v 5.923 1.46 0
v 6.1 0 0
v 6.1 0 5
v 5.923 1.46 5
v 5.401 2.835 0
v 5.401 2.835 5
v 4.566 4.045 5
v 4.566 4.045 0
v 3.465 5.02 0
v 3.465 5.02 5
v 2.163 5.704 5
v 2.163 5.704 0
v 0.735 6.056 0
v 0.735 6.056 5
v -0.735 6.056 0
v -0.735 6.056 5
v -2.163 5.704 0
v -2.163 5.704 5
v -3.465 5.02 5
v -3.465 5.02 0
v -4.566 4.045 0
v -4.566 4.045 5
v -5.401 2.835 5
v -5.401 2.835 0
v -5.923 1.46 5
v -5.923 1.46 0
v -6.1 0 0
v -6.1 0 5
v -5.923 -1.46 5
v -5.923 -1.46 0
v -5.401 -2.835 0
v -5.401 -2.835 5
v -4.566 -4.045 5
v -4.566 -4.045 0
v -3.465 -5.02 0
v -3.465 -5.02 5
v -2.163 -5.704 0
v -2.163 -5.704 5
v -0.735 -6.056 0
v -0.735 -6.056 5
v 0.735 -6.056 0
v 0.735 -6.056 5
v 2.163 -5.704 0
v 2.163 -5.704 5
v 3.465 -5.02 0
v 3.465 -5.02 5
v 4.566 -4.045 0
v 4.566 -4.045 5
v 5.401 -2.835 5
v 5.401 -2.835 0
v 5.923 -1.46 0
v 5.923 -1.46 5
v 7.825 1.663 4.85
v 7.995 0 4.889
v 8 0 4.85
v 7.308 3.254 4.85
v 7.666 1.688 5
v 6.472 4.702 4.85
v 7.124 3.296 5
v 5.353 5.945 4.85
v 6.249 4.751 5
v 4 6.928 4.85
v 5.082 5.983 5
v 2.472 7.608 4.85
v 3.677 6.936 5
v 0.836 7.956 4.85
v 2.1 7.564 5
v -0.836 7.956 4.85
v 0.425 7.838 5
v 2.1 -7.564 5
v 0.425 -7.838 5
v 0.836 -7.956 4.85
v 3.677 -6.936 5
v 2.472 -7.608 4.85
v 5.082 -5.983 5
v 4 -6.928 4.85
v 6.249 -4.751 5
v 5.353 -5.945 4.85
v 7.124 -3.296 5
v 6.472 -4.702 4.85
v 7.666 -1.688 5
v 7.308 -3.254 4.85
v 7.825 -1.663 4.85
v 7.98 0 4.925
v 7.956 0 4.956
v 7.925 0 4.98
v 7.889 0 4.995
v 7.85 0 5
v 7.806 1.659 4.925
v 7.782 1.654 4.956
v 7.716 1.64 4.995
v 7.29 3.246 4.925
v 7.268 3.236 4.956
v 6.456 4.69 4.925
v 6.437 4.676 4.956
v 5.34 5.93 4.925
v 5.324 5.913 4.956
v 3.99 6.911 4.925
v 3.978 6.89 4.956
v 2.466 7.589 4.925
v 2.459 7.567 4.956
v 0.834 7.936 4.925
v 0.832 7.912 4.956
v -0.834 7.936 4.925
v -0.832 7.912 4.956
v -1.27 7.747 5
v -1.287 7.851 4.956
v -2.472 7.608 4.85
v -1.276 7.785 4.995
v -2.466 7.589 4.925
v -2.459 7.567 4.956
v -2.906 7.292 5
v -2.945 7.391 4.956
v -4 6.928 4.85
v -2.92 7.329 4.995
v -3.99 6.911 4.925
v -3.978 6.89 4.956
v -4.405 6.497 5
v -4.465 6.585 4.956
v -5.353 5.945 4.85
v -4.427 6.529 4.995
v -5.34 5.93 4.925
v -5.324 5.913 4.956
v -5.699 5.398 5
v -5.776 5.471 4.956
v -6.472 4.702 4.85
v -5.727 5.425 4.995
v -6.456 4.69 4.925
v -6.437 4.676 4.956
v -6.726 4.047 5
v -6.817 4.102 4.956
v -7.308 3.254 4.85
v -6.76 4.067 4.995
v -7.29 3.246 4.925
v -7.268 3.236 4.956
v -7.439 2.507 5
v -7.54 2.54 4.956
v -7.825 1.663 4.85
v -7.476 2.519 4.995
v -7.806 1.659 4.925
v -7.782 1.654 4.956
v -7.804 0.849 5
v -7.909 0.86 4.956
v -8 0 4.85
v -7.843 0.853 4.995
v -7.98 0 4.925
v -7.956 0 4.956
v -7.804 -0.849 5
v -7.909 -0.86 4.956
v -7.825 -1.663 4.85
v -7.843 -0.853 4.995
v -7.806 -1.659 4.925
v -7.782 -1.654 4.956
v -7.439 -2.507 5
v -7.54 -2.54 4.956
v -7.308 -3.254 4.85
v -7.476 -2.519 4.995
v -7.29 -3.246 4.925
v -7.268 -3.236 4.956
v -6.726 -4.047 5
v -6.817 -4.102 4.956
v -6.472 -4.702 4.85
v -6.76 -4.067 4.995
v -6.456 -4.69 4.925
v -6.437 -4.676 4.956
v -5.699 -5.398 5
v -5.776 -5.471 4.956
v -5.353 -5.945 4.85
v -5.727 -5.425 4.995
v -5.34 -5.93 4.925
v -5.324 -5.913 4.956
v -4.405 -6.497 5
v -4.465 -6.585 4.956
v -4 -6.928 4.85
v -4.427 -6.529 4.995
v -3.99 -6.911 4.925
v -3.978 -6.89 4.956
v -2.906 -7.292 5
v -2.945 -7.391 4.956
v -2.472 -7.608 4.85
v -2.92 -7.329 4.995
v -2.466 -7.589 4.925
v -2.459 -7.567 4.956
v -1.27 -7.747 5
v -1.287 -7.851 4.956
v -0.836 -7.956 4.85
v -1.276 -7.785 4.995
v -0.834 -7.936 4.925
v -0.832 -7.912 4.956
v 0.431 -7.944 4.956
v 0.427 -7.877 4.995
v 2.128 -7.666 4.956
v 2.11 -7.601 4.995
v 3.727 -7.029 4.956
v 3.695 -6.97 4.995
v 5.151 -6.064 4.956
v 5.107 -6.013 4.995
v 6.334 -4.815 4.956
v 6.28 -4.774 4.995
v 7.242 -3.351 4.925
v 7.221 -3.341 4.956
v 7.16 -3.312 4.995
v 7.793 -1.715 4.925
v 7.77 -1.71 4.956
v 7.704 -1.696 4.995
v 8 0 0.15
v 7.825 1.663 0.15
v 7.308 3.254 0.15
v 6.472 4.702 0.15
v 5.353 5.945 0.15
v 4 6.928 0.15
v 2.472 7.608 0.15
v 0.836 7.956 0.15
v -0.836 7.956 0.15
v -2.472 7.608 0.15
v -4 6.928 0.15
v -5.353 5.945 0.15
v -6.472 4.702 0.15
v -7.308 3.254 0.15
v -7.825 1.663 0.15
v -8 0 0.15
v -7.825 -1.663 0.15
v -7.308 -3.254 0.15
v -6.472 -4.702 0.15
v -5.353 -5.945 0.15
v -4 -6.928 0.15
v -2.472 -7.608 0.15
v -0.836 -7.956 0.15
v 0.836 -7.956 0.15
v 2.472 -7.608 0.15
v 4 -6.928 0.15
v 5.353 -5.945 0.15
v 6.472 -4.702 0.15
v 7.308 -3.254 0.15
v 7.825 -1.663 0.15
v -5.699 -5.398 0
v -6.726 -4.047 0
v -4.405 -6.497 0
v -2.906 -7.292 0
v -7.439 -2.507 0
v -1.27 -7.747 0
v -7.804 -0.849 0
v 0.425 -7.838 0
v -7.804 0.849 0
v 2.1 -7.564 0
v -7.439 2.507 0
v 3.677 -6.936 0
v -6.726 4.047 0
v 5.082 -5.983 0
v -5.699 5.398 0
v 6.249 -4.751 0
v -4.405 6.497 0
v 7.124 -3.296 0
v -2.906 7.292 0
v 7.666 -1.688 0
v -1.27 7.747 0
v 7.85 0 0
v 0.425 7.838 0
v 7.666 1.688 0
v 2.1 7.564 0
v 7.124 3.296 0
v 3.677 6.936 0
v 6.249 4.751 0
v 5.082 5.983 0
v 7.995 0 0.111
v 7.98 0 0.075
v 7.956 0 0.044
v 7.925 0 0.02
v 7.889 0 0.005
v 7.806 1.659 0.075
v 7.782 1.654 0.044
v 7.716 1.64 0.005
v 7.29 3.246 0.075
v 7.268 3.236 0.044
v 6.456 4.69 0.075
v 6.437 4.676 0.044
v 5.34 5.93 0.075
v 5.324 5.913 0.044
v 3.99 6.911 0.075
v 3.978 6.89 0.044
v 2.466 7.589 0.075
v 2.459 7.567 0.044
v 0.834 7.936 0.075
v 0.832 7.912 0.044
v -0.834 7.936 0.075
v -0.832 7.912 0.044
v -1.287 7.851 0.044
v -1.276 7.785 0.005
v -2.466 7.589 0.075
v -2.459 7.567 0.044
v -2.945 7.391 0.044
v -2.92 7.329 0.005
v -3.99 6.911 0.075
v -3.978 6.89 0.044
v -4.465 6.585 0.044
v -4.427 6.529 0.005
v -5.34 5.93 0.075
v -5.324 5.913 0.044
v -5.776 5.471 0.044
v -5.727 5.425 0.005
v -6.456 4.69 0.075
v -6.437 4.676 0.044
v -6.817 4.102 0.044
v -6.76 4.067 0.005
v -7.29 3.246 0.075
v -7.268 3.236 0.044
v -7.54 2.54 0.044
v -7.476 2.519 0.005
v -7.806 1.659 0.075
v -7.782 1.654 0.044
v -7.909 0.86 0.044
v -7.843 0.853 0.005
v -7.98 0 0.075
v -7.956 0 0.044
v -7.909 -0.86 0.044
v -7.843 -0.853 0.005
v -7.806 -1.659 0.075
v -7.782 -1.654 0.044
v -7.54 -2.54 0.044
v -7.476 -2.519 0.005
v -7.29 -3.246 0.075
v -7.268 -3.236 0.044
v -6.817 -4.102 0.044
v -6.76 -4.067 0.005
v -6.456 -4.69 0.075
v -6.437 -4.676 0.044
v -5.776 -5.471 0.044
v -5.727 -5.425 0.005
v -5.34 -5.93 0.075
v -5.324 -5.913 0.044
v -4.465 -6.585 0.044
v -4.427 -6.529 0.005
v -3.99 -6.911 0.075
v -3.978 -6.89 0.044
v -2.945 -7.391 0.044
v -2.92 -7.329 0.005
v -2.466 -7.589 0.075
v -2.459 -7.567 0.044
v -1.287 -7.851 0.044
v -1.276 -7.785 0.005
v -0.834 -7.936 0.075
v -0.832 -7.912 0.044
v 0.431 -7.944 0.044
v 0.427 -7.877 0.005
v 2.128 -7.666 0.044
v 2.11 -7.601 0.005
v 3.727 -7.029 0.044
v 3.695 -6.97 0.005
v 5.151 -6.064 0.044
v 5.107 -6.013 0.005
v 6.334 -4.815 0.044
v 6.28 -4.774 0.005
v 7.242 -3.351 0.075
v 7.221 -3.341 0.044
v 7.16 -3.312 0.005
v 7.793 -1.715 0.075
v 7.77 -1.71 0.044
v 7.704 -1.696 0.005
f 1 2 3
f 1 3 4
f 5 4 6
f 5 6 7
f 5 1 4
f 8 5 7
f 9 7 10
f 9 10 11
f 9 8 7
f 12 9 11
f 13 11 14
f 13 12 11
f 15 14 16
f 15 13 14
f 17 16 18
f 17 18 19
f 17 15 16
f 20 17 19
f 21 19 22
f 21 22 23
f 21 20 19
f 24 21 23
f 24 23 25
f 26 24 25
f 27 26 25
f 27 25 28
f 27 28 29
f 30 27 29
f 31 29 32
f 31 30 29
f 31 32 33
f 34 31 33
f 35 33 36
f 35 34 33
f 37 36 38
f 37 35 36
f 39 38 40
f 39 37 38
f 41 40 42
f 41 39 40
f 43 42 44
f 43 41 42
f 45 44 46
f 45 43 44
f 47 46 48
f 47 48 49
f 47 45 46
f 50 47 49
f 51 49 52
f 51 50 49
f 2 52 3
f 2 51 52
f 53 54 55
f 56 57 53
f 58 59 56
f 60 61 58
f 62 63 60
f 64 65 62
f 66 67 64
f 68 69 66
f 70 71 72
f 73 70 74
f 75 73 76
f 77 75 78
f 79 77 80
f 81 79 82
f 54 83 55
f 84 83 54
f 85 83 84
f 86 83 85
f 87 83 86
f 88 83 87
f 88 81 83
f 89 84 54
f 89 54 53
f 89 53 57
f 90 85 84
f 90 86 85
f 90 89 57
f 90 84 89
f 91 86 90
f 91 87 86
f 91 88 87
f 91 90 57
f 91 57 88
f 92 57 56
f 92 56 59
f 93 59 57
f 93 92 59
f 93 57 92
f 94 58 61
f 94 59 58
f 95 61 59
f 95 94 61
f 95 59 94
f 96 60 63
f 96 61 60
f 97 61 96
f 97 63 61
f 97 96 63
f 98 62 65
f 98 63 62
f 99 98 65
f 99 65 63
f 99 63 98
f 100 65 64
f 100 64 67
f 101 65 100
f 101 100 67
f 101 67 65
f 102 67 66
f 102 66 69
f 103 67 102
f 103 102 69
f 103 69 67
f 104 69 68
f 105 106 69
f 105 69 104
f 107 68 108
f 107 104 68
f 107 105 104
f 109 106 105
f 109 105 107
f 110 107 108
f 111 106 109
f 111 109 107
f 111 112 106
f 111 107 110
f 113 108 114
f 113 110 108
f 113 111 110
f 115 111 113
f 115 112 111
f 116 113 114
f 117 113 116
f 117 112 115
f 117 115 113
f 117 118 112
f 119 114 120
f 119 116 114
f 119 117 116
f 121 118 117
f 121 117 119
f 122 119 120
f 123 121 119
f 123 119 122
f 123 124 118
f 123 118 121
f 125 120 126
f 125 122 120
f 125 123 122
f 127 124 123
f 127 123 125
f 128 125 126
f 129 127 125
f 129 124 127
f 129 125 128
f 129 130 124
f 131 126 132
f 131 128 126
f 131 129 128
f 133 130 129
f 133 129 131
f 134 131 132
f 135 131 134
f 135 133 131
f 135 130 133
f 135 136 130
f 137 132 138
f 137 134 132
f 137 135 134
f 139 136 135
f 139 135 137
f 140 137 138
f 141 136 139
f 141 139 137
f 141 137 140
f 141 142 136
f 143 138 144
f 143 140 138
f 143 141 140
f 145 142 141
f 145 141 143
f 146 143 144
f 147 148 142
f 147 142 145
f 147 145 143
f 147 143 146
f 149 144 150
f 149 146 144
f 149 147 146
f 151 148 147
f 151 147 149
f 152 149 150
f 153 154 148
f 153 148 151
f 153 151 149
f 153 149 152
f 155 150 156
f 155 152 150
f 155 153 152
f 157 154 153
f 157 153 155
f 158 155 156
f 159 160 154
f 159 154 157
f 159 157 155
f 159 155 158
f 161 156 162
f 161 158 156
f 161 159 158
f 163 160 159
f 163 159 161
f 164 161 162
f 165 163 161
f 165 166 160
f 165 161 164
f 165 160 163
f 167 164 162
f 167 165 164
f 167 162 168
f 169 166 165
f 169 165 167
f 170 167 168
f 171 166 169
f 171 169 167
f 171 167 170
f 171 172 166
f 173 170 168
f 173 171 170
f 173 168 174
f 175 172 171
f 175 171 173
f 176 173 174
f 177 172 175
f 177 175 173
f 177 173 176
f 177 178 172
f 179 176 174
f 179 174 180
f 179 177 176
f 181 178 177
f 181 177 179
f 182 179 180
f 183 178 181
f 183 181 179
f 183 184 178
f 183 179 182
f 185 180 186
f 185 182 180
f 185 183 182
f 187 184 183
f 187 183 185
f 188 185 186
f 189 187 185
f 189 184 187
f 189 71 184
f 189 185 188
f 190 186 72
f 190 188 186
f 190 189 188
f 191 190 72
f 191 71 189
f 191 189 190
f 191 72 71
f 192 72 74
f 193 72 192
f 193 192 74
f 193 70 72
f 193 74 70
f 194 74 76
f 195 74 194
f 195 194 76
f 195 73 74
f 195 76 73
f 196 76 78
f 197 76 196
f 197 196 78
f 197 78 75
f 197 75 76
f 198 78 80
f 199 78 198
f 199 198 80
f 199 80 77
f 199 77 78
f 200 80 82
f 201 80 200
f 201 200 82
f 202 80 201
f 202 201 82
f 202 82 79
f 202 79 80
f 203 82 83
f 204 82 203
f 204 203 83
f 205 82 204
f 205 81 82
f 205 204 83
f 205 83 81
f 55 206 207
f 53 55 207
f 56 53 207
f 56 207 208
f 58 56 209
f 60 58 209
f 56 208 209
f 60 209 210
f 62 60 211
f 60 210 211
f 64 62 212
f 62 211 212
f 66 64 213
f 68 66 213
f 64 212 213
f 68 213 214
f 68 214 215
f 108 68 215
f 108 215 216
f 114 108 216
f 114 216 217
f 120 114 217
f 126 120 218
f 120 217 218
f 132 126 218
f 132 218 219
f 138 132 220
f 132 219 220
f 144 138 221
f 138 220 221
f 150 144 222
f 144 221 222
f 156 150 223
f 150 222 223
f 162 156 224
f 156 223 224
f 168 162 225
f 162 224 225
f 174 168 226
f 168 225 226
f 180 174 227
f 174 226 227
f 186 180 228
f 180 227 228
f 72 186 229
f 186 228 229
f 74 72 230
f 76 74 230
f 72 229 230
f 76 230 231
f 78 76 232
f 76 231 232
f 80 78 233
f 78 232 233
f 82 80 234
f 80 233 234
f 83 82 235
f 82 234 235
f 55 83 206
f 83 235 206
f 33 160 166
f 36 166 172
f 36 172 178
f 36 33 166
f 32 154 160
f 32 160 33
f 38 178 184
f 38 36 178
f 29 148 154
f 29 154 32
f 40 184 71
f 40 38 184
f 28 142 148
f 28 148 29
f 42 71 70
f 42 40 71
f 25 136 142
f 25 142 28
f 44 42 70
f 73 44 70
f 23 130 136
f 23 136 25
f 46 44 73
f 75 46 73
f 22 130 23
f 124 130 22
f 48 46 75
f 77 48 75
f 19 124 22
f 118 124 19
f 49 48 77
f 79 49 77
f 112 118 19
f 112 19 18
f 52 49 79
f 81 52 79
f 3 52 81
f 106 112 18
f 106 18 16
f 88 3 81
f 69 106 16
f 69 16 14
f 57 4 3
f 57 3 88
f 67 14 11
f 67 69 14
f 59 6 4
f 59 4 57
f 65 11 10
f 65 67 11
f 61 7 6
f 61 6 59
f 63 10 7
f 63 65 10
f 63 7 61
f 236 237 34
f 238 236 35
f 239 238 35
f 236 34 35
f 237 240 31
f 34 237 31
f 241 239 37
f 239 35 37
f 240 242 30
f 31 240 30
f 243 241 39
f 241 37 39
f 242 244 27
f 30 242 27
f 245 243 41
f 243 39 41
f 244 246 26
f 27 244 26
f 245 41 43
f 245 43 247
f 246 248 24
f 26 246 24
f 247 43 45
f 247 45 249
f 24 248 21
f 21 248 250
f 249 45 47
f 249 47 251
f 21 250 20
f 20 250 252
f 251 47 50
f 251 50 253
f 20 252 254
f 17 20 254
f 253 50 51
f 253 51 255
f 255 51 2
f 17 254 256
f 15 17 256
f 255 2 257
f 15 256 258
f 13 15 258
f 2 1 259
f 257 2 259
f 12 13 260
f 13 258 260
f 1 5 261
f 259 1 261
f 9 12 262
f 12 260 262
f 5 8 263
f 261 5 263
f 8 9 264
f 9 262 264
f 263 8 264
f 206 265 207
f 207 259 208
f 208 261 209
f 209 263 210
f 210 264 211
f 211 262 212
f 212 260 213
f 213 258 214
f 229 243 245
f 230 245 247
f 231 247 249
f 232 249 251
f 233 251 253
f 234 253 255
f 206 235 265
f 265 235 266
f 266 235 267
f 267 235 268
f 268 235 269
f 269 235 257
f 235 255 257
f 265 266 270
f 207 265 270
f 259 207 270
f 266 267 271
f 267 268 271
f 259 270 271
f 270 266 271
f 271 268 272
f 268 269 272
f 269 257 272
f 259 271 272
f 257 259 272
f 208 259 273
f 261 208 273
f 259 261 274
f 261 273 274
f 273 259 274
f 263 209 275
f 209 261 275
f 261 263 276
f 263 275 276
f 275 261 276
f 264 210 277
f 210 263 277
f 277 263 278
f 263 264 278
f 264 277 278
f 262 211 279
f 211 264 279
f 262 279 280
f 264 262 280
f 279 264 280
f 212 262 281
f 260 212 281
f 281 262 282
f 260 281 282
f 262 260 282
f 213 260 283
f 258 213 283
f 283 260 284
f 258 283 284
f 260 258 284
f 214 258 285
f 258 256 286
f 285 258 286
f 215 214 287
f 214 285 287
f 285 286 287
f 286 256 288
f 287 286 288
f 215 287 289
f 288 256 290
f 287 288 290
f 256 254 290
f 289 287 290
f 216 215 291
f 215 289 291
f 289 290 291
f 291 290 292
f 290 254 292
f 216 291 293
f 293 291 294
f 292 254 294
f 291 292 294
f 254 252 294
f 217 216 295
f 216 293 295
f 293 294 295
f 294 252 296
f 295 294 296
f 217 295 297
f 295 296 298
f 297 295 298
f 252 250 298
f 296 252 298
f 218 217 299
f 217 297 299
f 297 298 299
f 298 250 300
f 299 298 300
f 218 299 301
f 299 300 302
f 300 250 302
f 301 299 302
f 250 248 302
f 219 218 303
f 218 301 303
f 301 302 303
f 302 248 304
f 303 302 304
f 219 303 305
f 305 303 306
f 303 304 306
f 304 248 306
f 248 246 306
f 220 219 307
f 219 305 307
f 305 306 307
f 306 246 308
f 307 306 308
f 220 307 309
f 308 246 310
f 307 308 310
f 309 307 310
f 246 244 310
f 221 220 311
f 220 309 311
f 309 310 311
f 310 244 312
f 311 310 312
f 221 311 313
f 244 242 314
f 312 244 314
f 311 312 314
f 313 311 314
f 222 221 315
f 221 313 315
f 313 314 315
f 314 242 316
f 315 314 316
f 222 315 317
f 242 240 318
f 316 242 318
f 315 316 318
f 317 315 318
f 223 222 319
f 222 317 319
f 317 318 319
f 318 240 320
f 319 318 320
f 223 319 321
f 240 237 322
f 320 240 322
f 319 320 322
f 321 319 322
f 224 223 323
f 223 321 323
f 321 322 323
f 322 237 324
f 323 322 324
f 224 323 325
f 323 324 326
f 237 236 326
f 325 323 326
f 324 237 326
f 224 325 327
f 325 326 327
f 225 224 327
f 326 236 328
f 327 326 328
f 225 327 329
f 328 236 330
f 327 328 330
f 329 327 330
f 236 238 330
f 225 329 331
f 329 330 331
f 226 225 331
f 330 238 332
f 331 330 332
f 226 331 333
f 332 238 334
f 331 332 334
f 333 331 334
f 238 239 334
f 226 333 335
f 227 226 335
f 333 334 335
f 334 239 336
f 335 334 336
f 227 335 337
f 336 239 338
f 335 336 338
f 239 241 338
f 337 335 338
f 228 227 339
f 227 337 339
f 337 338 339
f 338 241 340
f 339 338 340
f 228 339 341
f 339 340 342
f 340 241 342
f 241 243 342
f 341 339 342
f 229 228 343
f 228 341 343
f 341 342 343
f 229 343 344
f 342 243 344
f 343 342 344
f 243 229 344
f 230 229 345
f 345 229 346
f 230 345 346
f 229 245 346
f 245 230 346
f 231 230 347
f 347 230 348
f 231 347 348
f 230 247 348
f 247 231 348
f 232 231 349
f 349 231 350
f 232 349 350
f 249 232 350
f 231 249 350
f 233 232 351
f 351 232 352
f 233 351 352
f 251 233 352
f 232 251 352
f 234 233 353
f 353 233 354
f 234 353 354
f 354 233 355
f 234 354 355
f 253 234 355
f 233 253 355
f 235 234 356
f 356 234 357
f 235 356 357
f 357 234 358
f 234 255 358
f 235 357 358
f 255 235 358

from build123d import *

# Parameters (mm, degrees)
CYLINDER002_R     = 6.1
CYLINDER002_DEPTH = 5
CYLINDER_R        = 8
CYLINDER_DEPTH    = 5
FILLET001_R       = 0.15


with BuildPart() as cilindro:
    # Cylinder002 → Cylinder002 (new body)
    with BuildSketch(Plane.XY):
        Circle(CYLINDER002_R)
    extrude(amount=CYLINDER002_DEPTH)


with BuildPart() as fillet001:
    # Cylinder → Cylinder (new body)
    with BuildSketch(Plane.XY):
        Circle(CYLINDER_R)
    extrude(amount=CYLINDER_DEPTH)

    # Cut: cut Cilindro
    add(cilindro.part, mode=Mode.SUBTRACT)

    # Fillet001
    fillet001_edges = [fillet001.edges().sort_by_distance(p)[0] for p in [
        (-8, 0, 0),
        (-8, 0, 5),
    ]]
    fillet(fillet001_edges, radius=FILLET001_R)


solid = fillet001.part
